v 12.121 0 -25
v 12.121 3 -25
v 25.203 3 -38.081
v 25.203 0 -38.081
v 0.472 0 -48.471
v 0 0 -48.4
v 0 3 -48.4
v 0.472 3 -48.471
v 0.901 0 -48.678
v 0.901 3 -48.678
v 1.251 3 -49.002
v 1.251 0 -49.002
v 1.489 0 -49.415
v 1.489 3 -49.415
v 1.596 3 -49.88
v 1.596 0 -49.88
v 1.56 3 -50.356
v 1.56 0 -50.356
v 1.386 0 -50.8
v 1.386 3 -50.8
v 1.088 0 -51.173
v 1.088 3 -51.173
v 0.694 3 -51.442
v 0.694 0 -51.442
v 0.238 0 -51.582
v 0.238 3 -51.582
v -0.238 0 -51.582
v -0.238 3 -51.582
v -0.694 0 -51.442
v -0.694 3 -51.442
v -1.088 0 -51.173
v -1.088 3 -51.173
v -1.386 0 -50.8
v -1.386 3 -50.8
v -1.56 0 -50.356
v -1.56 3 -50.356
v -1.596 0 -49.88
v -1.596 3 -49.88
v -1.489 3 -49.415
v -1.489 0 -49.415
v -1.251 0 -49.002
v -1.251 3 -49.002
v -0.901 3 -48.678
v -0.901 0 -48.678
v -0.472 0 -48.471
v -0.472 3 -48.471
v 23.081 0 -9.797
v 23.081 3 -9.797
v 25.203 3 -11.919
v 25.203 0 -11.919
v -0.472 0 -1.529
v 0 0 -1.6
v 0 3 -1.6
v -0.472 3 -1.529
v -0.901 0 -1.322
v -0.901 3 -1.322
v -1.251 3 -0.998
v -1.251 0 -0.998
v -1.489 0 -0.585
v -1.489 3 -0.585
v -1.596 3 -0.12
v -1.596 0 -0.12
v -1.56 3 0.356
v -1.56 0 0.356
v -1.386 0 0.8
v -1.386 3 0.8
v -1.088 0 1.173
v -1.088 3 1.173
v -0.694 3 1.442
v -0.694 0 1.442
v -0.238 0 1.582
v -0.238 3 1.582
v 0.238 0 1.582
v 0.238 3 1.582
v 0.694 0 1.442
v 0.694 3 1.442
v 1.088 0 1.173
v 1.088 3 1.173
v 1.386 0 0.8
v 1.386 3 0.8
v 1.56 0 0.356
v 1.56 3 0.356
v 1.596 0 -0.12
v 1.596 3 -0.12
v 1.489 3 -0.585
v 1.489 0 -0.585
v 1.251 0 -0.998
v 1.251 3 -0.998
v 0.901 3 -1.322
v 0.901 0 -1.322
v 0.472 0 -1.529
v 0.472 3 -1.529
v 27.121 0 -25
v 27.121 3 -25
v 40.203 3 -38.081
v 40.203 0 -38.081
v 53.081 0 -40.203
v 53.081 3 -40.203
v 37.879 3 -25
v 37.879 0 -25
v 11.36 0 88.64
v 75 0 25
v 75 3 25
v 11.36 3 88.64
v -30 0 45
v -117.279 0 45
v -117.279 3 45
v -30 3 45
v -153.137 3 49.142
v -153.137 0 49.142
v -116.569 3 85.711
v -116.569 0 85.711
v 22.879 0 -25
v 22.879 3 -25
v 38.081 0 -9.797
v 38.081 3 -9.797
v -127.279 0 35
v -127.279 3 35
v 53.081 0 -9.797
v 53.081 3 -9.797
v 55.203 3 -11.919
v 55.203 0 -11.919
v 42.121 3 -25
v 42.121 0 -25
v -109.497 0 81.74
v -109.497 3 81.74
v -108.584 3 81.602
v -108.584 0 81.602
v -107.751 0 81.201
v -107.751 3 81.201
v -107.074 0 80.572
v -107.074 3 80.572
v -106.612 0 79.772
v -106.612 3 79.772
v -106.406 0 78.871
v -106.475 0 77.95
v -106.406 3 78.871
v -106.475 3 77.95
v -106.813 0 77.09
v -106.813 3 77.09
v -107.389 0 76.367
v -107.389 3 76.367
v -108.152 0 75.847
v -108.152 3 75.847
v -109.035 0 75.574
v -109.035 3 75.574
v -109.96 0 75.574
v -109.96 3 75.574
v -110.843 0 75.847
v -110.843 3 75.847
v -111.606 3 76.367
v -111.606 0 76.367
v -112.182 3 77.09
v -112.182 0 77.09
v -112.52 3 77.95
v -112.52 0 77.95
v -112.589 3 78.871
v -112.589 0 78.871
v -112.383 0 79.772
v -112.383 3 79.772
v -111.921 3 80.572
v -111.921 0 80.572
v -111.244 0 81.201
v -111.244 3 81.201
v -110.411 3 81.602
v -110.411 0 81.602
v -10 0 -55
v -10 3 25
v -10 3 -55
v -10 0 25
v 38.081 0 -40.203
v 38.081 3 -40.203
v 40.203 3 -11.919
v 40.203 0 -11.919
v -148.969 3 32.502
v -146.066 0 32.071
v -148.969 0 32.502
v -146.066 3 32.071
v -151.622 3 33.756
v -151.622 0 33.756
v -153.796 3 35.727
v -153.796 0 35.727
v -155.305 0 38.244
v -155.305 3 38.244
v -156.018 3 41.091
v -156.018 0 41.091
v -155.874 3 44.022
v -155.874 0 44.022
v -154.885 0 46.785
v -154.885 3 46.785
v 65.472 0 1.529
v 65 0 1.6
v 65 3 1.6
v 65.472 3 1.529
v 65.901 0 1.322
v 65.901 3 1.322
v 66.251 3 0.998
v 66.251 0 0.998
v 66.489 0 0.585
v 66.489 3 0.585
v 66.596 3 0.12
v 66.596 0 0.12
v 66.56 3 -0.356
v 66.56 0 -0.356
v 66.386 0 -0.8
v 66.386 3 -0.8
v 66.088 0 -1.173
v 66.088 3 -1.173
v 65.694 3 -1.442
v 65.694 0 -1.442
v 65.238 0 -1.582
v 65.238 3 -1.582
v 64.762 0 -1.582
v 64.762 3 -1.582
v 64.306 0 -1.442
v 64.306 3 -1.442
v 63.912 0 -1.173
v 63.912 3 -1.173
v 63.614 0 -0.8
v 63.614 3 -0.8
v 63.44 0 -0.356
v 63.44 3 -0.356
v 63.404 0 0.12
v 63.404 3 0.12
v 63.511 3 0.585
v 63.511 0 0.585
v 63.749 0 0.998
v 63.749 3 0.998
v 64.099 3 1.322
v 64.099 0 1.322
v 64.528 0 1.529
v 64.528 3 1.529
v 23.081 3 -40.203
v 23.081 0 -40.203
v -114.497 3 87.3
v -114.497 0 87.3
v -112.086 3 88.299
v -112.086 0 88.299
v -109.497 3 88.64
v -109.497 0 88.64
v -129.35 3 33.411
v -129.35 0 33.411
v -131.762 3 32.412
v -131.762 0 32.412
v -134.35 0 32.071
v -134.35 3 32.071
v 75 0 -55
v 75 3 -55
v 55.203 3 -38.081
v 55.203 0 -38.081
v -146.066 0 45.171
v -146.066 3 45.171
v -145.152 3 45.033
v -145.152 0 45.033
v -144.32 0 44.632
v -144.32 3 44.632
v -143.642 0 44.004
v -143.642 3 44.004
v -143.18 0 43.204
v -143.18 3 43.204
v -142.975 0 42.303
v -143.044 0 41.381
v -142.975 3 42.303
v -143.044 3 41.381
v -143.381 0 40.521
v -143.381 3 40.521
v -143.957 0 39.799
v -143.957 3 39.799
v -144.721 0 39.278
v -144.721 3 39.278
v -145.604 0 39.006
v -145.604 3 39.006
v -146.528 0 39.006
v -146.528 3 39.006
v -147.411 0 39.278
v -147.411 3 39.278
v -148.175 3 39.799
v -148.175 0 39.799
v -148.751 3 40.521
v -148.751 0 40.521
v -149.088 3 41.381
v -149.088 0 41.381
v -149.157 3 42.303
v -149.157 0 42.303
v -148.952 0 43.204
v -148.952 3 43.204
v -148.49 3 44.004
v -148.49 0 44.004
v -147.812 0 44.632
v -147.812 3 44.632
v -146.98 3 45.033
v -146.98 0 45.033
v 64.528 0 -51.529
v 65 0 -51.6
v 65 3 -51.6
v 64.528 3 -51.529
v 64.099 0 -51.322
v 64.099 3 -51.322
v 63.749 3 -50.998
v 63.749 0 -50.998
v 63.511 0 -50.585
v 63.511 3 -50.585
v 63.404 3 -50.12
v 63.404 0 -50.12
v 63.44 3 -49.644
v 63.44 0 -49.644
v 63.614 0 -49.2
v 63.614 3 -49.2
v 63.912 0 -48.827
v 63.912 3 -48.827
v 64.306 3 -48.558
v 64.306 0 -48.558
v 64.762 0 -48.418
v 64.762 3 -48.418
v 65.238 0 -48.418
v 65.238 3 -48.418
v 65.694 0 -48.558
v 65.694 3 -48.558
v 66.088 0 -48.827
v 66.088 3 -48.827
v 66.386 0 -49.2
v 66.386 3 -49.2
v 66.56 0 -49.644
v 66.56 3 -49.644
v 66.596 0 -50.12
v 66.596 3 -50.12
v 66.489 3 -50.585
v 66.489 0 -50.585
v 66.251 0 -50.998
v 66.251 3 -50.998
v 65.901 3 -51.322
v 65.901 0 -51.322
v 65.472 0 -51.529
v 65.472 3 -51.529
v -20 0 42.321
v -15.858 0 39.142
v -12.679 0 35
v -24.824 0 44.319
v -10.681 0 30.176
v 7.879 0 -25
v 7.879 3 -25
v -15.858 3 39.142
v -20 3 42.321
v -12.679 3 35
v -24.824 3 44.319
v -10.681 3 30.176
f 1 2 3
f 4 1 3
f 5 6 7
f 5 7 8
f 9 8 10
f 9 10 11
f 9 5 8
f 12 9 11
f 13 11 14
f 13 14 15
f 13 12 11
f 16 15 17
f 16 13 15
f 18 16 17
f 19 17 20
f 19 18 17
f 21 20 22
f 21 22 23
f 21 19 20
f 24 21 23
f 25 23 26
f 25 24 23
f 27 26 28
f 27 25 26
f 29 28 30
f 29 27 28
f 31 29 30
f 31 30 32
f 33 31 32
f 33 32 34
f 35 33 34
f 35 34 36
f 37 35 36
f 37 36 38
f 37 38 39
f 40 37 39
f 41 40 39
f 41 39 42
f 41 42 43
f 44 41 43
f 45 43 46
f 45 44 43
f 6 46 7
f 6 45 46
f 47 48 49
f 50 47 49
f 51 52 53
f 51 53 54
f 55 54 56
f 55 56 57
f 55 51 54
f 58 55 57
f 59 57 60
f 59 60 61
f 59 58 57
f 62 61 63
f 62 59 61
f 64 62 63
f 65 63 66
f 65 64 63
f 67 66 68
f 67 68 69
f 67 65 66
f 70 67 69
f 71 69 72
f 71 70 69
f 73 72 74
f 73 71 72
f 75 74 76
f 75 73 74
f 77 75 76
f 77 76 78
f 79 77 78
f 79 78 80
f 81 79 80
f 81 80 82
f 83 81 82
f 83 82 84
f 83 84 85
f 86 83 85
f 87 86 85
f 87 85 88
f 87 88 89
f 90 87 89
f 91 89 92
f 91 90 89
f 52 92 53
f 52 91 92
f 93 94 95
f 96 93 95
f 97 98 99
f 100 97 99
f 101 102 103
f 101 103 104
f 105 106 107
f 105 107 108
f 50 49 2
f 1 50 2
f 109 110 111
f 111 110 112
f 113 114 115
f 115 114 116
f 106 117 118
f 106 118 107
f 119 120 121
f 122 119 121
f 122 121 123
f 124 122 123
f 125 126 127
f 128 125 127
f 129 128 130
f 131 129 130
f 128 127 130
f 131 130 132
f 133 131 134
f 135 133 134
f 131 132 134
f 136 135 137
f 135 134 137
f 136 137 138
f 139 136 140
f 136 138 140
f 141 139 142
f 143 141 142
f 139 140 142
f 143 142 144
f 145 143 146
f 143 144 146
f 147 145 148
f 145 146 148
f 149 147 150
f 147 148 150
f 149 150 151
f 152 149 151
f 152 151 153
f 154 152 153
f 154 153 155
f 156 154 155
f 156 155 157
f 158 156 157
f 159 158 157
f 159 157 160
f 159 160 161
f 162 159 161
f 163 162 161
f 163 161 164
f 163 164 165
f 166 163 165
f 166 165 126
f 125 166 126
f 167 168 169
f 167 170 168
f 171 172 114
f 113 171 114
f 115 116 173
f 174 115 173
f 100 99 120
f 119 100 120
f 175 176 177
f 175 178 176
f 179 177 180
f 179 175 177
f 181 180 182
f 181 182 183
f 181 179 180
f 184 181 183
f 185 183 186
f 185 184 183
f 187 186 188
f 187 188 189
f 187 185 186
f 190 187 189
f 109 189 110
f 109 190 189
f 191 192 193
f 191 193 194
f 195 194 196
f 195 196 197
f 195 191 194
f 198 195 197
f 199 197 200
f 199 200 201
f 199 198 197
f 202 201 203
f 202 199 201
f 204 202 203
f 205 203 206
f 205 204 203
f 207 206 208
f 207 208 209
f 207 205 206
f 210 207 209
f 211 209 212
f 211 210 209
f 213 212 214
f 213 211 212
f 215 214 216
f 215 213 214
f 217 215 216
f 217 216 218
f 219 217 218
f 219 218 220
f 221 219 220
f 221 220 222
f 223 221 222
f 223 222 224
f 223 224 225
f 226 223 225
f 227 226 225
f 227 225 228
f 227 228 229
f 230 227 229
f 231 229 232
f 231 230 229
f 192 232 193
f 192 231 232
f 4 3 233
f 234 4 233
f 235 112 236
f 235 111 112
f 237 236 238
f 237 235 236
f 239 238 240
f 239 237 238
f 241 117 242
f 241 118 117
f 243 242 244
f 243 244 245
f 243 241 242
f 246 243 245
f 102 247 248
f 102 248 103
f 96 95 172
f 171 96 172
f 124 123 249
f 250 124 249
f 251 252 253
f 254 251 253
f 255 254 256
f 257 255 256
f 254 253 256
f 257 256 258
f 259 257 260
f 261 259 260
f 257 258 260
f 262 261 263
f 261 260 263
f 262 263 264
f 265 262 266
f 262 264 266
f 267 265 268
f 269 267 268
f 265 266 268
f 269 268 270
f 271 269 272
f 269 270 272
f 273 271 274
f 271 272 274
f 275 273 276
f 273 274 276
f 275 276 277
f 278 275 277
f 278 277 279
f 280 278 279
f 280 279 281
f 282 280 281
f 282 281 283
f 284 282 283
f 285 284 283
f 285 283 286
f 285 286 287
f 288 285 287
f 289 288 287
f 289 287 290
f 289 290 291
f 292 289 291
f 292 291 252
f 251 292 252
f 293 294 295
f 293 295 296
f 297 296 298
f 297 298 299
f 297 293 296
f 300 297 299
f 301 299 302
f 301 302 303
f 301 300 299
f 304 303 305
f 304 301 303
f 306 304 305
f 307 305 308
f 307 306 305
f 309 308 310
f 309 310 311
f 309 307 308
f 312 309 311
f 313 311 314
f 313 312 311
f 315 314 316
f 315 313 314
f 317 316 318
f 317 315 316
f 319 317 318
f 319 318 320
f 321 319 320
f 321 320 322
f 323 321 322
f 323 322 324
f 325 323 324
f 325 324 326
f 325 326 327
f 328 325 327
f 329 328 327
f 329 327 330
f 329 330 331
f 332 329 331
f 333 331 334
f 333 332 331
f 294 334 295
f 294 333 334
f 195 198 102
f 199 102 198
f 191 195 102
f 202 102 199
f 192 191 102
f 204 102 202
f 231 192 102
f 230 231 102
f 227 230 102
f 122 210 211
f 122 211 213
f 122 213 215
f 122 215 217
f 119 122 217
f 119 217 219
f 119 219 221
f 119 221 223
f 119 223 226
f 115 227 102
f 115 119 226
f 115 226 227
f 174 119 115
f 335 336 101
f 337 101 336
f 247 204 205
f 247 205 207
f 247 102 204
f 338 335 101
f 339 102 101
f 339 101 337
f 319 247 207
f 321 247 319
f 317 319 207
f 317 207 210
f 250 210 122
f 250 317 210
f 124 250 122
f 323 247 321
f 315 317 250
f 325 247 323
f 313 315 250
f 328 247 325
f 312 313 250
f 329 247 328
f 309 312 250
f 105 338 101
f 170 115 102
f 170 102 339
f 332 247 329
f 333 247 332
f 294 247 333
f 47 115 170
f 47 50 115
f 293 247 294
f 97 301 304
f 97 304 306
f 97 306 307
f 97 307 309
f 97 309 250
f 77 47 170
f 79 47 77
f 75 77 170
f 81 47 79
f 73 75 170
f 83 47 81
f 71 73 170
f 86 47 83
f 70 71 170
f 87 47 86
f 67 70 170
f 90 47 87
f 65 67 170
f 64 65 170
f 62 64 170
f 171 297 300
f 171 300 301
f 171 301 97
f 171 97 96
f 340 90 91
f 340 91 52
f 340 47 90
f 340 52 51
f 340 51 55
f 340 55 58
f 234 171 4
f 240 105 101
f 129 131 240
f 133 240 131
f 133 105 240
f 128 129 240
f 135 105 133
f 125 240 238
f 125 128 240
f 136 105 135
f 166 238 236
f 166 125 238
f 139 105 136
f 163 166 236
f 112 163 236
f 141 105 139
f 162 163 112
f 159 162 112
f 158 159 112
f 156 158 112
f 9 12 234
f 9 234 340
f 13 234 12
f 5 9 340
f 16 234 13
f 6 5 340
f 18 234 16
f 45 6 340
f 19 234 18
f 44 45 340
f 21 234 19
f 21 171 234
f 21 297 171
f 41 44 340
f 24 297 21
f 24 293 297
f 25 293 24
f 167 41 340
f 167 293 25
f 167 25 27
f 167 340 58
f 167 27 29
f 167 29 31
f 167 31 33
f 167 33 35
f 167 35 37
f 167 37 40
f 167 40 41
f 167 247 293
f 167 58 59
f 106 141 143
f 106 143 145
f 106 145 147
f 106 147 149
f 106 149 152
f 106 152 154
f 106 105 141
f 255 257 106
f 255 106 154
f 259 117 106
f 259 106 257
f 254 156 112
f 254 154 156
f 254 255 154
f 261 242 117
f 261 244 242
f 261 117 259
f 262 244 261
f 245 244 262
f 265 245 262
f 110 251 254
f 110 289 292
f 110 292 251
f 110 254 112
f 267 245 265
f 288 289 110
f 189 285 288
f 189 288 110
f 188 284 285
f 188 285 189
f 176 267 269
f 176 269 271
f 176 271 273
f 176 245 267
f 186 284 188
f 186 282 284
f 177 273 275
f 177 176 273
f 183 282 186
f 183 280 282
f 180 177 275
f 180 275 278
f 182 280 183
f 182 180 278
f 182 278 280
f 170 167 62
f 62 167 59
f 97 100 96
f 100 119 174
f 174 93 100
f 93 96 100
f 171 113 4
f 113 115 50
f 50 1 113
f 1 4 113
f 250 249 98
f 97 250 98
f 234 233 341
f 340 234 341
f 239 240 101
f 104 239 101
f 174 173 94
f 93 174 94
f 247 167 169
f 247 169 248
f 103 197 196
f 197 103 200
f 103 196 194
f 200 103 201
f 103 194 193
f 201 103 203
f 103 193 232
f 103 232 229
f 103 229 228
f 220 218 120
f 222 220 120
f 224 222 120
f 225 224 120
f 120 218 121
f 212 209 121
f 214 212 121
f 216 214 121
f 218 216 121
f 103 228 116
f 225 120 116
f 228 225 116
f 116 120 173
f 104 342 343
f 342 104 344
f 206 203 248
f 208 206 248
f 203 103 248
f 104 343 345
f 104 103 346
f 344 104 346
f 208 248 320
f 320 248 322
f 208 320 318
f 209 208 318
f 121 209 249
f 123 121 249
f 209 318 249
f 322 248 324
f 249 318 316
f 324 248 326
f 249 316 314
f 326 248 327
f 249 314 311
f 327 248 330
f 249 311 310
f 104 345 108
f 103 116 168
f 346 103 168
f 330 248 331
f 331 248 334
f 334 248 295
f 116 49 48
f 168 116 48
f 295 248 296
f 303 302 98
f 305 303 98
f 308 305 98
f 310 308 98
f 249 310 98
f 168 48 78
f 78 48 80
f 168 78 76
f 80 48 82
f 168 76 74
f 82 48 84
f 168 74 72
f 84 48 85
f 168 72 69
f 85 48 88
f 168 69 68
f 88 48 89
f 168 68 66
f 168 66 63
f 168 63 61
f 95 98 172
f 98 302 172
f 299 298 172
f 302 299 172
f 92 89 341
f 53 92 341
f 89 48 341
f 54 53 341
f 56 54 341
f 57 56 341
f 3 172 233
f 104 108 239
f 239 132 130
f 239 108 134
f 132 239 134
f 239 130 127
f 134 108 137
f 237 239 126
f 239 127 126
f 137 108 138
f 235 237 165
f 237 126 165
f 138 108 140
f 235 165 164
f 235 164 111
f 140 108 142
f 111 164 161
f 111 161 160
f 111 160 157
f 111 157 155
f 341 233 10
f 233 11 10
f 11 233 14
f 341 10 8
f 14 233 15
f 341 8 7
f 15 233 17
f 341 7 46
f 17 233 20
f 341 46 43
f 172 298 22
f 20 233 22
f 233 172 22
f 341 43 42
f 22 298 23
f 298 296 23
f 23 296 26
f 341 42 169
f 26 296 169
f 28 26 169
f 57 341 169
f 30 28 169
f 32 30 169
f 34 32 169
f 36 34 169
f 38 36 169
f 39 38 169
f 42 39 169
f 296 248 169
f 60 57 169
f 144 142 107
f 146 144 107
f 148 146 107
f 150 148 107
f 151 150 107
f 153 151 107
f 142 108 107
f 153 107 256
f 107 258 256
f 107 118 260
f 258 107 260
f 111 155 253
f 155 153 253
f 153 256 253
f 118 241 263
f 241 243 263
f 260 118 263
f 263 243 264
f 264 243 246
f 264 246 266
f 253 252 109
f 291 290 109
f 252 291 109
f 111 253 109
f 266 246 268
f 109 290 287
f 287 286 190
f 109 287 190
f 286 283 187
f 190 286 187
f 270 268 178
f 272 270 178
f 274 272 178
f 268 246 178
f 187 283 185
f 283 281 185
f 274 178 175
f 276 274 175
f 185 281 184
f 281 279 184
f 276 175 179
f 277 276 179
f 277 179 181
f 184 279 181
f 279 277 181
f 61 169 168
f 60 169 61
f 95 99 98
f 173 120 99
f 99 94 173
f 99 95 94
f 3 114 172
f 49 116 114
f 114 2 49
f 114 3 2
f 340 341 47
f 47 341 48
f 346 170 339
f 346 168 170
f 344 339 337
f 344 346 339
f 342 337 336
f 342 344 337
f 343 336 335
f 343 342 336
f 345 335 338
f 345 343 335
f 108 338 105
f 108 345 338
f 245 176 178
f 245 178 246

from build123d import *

# Parameters (mm, degrees)
SKETCH_1_W            = 85
SKETCH_1_H            = 60
SKETCH_1_R            = 1.6
EXTRUDE_1_DEPTH       = 3
EXTRUDE_2_DEPTH       = 3
FILLET_1_R            = 20
FILLET_3_R            = 10
SKETCH_4_R            = 3.1
CUT_EXTRUDE_1_DEPTH   = 10
CUT_EXTRUDE_1_2_DEPTH = 10


with BuildPart() as part:
    # 草图1 → 凸台-拉伸1 (new body)
    with BuildSketch(Plane(origin=(0, 0, 0), x_dir=(1, 0, 0), z_dir=(0, 1, 0))):
        with Locations((32.5, 25)):
            Rectangle(SKETCH_1_W, SKETCH_1_H)
        with Locations(Location((0, 50, 0), (0, 0, 270))):
            Circle(SKETCH_1_R, mode=Mode.SUBTRACT)
        with Locations(Location((65, 50, 0), (0, 0, 90))):
            Circle(SKETCH_1_R, mode=Mode.SUBTRACT)
        with Locations(Location((65, 0, 0), (0, 0, 270))):
            Circle(SKETCH_1_R, mode=Mode.SUBTRACT)
        with Locations(Location((0, 0, 0), (0, 0, 90))):
            Circle(SKETCH_1_R, mode=Mode.SUBTRACT)
    extrude(amount=EXTRUDE_1_DEPTH)

    # 草图2 → 凸台-拉伸2 (add)
    with BuildSketch(Plane(origin=(0, 0, 0), x_dir=(1, 0, 0), z_dir=(0, 1, 0))):
        Polygon((-10, -5), (75, -5), (75, -25), (11.360389693, -88.639610307), (-58.172444533, -88.639610307), (-113.639610307, -88.639610307), (-157.279220614, -45), (-170.208152802, -32.071067812), (-130.208152802, -32.071067812), (-117.279220614, -45), (-10, -45), align=None)
    extrude(amount=EXTRUDE_2_DEPTH)

    # 圆角1
    fillet_1_edges = [part.edges().sort_by_distance(p)[0] for p in [
        (-10, 1.5, 45),
    ]]
    fillet(fillet_1_edges, radius=FILLET_1_R)

    # 圆角3
    fillet_3_edges = [part.edges().sort_by_distance(p)[0] for p in [
        (-130.208152802, 1.5, 32.071067812),
        (-170.208152802, 1.5, 32.071067812),
        (-113.639610307, 1.5, 88.639610307),
    ]]
    fillet(fillet_3_edges, radius=FILLET_3_R)

    # 草图4 → Cut-Extrude 1 (cut)
    with BuildSketch(Plane(origin=(0, 3, 0), x_dir=(1, 0, 0), z_dir=(0, 1, 0))):
        with Locations(Location((-146.066017178, -42.071067812, 0), (0, 0, 270))):
            Circle(SKETCH_4_R)
        with Locations(Location((-109.497474683, -78.639610307, 0), (0, 0, 270))):
            Circle(SKETCH_4_R)
    extrude(amount=-CUT_EXTRUDE_1_DEPTH, mode=Mode.SUBTRACT)

    # 草图5 → Cut-Extrude 1 2 (cut)
    with BuildSketch(Plane(origin=(0, 3, 0), x_dir=(1, 0, 0), z_dir=(0, 1, 0))):
        Polygon((25.202795796, 11.918524548), (12.121320344, 25), (25.202795796, 38.081475452), (23.081475452, 40.202795796), (7.878679656, 25), (23.081475452, 9.797204204), align=None)
        Polygon((40.202795796, 11.918524548), (27.121320344, 25), (40.202795796, 38.081475452), (38.081475452, 40.202795796), (22.878679656, 25), (38.081475452, 9.797204204), align=None)
        Polygon((55.202795796, 11.918524548), (42.121320344, 25), (55.202795796, 38.081475452), (53.081475452, 40.202795796), (37.878679656, 25), (53.081475452, 9.797204204), align=None)
    extrude(amount=-CUT_EXTRUDE_1_2_DEPTH, mode=Mode.SUBTRACT)


solid = part.part
